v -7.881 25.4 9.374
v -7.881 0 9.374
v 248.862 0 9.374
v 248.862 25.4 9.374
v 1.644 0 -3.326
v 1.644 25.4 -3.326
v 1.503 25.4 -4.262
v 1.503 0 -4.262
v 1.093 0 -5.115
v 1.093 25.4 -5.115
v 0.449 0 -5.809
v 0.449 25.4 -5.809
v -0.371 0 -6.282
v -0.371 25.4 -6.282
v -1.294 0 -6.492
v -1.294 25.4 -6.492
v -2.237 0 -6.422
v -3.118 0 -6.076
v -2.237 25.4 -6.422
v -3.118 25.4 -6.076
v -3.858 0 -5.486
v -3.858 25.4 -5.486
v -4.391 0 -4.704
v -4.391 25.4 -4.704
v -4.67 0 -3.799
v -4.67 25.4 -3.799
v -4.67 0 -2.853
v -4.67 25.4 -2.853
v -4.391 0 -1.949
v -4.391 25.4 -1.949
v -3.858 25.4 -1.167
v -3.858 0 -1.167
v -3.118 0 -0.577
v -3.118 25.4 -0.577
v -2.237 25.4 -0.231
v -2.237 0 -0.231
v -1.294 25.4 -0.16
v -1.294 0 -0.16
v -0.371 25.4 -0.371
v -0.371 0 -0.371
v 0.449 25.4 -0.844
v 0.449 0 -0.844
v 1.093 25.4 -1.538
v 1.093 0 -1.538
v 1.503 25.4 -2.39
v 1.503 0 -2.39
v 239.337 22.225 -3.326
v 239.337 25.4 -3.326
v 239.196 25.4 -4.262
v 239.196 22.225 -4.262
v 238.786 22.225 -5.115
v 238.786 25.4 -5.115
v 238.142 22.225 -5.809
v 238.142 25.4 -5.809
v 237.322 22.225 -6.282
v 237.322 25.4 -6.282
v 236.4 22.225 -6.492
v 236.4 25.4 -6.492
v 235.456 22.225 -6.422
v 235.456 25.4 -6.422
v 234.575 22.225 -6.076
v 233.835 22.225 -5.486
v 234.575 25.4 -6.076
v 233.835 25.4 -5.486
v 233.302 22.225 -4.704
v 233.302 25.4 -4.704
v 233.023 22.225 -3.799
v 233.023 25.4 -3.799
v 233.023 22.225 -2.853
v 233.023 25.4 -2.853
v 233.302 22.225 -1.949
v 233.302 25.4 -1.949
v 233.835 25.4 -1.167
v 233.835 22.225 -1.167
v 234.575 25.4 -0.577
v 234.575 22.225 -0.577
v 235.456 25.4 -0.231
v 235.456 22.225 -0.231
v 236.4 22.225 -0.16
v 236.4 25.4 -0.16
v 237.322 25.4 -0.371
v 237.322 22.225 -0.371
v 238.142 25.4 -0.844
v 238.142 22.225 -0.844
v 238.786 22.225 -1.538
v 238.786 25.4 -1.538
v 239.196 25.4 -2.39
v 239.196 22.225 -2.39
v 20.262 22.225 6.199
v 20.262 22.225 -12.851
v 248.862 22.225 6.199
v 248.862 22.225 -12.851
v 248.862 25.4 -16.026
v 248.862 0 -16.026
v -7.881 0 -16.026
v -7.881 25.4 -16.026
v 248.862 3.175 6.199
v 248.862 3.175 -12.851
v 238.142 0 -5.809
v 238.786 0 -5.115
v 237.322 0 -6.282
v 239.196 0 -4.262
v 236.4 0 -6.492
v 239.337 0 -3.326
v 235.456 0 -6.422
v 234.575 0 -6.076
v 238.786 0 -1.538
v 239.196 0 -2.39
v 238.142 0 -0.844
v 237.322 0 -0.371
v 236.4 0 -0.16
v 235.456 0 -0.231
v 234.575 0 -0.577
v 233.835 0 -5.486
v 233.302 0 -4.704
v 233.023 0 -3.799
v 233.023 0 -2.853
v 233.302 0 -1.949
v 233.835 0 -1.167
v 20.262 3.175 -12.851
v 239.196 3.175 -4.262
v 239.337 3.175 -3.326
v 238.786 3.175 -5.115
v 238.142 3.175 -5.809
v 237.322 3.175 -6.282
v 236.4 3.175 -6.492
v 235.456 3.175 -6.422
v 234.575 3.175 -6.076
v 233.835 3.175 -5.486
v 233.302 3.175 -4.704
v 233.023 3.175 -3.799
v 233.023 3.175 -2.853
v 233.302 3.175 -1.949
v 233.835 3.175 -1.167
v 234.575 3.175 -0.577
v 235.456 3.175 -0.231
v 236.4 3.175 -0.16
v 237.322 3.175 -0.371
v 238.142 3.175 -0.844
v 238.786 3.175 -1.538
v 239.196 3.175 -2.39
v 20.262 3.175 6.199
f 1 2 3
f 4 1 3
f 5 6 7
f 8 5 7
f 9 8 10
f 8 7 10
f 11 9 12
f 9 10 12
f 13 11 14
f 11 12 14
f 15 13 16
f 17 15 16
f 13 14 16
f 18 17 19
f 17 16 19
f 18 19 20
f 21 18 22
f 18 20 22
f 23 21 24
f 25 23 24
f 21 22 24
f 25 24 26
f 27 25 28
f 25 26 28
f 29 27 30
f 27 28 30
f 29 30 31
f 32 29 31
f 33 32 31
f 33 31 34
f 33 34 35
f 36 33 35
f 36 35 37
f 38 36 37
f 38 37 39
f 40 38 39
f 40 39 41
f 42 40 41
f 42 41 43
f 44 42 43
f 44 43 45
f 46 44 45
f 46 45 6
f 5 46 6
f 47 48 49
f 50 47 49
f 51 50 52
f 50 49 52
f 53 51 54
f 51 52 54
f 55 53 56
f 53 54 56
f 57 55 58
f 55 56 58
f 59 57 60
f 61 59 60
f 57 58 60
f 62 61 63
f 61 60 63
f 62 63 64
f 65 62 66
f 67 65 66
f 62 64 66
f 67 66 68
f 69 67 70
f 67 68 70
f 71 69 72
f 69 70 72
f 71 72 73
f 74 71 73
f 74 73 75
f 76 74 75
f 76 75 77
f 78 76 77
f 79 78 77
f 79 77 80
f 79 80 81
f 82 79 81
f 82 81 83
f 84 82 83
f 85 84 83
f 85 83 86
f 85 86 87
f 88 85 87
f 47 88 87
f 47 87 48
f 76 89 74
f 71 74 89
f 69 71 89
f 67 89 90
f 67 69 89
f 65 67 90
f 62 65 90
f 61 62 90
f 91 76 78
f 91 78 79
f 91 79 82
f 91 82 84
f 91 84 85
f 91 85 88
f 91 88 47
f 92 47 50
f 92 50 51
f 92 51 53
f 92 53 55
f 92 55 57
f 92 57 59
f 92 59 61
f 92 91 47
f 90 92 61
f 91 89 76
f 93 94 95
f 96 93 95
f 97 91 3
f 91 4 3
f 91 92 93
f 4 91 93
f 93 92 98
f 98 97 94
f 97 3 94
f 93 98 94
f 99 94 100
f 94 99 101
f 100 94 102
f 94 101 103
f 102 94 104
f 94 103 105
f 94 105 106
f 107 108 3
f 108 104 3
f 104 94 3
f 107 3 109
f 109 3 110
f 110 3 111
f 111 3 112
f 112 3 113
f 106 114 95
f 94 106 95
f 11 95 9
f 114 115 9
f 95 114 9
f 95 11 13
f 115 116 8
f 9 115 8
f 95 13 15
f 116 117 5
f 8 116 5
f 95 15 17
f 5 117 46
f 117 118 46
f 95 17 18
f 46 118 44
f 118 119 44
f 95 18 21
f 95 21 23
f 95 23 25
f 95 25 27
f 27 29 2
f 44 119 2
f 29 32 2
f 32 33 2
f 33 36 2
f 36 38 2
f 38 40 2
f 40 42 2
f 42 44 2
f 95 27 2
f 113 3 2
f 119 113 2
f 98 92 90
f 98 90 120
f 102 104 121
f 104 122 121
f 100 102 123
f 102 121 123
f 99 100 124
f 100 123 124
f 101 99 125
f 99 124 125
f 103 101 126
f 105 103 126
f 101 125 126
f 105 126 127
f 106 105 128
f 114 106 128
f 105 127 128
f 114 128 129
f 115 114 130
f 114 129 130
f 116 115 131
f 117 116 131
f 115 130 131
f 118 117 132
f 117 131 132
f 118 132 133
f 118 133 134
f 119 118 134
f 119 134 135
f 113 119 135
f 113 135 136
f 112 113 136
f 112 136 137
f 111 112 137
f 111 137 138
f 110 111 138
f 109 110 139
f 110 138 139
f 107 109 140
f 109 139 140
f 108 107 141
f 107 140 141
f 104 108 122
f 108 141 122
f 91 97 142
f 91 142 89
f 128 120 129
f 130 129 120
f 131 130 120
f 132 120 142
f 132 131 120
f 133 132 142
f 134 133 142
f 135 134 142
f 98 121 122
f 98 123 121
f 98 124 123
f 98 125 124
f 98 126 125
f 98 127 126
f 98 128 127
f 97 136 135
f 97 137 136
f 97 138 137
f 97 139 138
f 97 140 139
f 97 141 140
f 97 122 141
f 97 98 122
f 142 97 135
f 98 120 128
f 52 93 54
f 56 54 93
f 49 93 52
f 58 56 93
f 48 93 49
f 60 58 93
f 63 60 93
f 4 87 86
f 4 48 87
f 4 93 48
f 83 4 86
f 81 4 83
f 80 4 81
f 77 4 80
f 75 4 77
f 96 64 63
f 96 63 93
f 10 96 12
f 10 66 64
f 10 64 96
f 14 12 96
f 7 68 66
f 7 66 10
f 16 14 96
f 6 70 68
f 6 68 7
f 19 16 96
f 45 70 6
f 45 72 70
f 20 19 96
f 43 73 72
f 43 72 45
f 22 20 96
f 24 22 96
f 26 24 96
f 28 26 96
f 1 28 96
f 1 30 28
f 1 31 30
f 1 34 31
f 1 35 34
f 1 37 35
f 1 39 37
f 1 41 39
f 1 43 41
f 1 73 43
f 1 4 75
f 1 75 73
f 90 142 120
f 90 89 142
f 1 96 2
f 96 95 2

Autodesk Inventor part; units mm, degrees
ref_plane "YZ Plane" through (0, 0, 0) normal (1, 0, 0) x (0, 1, 0)
ref_plane "XZ Plane" through (0, 0, 0) normal (0, 1, 0) x (-1, 0, 0)
ref_plane "XY Plane" through (0, 0, 0) normal (0, 0, 1) x (1, 0, 0)
sketch "Sketch1" plane through (0, 0, 0) normal (0, 1, 0) x (-1, 0, 0)
  line L0 (7.8808, 9.3738) -> (-248.8624, 9.3738)
  line L1 (-248.8624, 9.3738) -> (-248.8624, -16.0262)
  line L2 (-248.8624, -16.0262) -> (7.8808, -16.0262)
  line L3 (7.8808, -16.0262) -> (7.8808, 9.3738)
  point P0 (0, 0)
  dimension "d0" = 25.4
  dimension "d1" = 256.7432
extrude "Extrusion1" add sketch "Sketch1" along normal blind 25.4
sketch "Sketch2" plane through (0, 25.4, 0) normal (0, 1, 0) x (1, 0, 0)
  line L0 (-7.8808, -9.3738) -> (248.8624, -9.3738)
  line L1 (248.8624, -9.3738) -> (248.8624, 16.0262)
  line L2 (248.8624, 16.0262) -> (-7.8808, 16.0262)
  line L3 (-7.8808, 16.0262) -> (-7.8808, -9.3738)
  circle A0 centre (-1.5308, 3.3262) radius 3.175
  circle A1 centre (236.1624, 3.3262) radius 3.175
  point P0 (0, 0)
  dimension "d4" = 6.35
  dimension "d5" = 6.35
  dimension "d6" = 237.6932
  dimension "d7" = 6.35
extrude "Extrusion2" cut sketch "Sketch2" against normal blind 25.4 contours A0 | A1
sketch "Sketch3" plane through (248.8624, 0, 9.3738) normal (1, 0, 0) x (0, 0, -1)
  line L0 (3.175, 22.225) -> (22.225, 22.225)
  line L1 (22.225, 22.225) -> (22.225, 3.175)
  line L2 (22.225, 3.175) -> (3.175, 3.175)
  line L3 (3.175, 3.175) -> (3.175, 22.225)
  line L4 (25.4, 0) -> (25.4, 25.4) projected
  line L5 (0, 25.4) -> (25.4, 25.4) projected
  line L6 (0, 0) -> (0, 25.4) projected
  line L7 (0, 0) -> (25.4, 0) projected
  point P0 (9.3738, 0)
  dimension "d10" = 3.175
  dimension "d11" = 3.175
  dimension "d12" = 3.175
  dimension "d13" = 3.175
extrude "Extrusion3" cut sketch "Sketch3" against normal blind 228.6 contours L0 L1 L2 L3
properties part number "Yarm"
